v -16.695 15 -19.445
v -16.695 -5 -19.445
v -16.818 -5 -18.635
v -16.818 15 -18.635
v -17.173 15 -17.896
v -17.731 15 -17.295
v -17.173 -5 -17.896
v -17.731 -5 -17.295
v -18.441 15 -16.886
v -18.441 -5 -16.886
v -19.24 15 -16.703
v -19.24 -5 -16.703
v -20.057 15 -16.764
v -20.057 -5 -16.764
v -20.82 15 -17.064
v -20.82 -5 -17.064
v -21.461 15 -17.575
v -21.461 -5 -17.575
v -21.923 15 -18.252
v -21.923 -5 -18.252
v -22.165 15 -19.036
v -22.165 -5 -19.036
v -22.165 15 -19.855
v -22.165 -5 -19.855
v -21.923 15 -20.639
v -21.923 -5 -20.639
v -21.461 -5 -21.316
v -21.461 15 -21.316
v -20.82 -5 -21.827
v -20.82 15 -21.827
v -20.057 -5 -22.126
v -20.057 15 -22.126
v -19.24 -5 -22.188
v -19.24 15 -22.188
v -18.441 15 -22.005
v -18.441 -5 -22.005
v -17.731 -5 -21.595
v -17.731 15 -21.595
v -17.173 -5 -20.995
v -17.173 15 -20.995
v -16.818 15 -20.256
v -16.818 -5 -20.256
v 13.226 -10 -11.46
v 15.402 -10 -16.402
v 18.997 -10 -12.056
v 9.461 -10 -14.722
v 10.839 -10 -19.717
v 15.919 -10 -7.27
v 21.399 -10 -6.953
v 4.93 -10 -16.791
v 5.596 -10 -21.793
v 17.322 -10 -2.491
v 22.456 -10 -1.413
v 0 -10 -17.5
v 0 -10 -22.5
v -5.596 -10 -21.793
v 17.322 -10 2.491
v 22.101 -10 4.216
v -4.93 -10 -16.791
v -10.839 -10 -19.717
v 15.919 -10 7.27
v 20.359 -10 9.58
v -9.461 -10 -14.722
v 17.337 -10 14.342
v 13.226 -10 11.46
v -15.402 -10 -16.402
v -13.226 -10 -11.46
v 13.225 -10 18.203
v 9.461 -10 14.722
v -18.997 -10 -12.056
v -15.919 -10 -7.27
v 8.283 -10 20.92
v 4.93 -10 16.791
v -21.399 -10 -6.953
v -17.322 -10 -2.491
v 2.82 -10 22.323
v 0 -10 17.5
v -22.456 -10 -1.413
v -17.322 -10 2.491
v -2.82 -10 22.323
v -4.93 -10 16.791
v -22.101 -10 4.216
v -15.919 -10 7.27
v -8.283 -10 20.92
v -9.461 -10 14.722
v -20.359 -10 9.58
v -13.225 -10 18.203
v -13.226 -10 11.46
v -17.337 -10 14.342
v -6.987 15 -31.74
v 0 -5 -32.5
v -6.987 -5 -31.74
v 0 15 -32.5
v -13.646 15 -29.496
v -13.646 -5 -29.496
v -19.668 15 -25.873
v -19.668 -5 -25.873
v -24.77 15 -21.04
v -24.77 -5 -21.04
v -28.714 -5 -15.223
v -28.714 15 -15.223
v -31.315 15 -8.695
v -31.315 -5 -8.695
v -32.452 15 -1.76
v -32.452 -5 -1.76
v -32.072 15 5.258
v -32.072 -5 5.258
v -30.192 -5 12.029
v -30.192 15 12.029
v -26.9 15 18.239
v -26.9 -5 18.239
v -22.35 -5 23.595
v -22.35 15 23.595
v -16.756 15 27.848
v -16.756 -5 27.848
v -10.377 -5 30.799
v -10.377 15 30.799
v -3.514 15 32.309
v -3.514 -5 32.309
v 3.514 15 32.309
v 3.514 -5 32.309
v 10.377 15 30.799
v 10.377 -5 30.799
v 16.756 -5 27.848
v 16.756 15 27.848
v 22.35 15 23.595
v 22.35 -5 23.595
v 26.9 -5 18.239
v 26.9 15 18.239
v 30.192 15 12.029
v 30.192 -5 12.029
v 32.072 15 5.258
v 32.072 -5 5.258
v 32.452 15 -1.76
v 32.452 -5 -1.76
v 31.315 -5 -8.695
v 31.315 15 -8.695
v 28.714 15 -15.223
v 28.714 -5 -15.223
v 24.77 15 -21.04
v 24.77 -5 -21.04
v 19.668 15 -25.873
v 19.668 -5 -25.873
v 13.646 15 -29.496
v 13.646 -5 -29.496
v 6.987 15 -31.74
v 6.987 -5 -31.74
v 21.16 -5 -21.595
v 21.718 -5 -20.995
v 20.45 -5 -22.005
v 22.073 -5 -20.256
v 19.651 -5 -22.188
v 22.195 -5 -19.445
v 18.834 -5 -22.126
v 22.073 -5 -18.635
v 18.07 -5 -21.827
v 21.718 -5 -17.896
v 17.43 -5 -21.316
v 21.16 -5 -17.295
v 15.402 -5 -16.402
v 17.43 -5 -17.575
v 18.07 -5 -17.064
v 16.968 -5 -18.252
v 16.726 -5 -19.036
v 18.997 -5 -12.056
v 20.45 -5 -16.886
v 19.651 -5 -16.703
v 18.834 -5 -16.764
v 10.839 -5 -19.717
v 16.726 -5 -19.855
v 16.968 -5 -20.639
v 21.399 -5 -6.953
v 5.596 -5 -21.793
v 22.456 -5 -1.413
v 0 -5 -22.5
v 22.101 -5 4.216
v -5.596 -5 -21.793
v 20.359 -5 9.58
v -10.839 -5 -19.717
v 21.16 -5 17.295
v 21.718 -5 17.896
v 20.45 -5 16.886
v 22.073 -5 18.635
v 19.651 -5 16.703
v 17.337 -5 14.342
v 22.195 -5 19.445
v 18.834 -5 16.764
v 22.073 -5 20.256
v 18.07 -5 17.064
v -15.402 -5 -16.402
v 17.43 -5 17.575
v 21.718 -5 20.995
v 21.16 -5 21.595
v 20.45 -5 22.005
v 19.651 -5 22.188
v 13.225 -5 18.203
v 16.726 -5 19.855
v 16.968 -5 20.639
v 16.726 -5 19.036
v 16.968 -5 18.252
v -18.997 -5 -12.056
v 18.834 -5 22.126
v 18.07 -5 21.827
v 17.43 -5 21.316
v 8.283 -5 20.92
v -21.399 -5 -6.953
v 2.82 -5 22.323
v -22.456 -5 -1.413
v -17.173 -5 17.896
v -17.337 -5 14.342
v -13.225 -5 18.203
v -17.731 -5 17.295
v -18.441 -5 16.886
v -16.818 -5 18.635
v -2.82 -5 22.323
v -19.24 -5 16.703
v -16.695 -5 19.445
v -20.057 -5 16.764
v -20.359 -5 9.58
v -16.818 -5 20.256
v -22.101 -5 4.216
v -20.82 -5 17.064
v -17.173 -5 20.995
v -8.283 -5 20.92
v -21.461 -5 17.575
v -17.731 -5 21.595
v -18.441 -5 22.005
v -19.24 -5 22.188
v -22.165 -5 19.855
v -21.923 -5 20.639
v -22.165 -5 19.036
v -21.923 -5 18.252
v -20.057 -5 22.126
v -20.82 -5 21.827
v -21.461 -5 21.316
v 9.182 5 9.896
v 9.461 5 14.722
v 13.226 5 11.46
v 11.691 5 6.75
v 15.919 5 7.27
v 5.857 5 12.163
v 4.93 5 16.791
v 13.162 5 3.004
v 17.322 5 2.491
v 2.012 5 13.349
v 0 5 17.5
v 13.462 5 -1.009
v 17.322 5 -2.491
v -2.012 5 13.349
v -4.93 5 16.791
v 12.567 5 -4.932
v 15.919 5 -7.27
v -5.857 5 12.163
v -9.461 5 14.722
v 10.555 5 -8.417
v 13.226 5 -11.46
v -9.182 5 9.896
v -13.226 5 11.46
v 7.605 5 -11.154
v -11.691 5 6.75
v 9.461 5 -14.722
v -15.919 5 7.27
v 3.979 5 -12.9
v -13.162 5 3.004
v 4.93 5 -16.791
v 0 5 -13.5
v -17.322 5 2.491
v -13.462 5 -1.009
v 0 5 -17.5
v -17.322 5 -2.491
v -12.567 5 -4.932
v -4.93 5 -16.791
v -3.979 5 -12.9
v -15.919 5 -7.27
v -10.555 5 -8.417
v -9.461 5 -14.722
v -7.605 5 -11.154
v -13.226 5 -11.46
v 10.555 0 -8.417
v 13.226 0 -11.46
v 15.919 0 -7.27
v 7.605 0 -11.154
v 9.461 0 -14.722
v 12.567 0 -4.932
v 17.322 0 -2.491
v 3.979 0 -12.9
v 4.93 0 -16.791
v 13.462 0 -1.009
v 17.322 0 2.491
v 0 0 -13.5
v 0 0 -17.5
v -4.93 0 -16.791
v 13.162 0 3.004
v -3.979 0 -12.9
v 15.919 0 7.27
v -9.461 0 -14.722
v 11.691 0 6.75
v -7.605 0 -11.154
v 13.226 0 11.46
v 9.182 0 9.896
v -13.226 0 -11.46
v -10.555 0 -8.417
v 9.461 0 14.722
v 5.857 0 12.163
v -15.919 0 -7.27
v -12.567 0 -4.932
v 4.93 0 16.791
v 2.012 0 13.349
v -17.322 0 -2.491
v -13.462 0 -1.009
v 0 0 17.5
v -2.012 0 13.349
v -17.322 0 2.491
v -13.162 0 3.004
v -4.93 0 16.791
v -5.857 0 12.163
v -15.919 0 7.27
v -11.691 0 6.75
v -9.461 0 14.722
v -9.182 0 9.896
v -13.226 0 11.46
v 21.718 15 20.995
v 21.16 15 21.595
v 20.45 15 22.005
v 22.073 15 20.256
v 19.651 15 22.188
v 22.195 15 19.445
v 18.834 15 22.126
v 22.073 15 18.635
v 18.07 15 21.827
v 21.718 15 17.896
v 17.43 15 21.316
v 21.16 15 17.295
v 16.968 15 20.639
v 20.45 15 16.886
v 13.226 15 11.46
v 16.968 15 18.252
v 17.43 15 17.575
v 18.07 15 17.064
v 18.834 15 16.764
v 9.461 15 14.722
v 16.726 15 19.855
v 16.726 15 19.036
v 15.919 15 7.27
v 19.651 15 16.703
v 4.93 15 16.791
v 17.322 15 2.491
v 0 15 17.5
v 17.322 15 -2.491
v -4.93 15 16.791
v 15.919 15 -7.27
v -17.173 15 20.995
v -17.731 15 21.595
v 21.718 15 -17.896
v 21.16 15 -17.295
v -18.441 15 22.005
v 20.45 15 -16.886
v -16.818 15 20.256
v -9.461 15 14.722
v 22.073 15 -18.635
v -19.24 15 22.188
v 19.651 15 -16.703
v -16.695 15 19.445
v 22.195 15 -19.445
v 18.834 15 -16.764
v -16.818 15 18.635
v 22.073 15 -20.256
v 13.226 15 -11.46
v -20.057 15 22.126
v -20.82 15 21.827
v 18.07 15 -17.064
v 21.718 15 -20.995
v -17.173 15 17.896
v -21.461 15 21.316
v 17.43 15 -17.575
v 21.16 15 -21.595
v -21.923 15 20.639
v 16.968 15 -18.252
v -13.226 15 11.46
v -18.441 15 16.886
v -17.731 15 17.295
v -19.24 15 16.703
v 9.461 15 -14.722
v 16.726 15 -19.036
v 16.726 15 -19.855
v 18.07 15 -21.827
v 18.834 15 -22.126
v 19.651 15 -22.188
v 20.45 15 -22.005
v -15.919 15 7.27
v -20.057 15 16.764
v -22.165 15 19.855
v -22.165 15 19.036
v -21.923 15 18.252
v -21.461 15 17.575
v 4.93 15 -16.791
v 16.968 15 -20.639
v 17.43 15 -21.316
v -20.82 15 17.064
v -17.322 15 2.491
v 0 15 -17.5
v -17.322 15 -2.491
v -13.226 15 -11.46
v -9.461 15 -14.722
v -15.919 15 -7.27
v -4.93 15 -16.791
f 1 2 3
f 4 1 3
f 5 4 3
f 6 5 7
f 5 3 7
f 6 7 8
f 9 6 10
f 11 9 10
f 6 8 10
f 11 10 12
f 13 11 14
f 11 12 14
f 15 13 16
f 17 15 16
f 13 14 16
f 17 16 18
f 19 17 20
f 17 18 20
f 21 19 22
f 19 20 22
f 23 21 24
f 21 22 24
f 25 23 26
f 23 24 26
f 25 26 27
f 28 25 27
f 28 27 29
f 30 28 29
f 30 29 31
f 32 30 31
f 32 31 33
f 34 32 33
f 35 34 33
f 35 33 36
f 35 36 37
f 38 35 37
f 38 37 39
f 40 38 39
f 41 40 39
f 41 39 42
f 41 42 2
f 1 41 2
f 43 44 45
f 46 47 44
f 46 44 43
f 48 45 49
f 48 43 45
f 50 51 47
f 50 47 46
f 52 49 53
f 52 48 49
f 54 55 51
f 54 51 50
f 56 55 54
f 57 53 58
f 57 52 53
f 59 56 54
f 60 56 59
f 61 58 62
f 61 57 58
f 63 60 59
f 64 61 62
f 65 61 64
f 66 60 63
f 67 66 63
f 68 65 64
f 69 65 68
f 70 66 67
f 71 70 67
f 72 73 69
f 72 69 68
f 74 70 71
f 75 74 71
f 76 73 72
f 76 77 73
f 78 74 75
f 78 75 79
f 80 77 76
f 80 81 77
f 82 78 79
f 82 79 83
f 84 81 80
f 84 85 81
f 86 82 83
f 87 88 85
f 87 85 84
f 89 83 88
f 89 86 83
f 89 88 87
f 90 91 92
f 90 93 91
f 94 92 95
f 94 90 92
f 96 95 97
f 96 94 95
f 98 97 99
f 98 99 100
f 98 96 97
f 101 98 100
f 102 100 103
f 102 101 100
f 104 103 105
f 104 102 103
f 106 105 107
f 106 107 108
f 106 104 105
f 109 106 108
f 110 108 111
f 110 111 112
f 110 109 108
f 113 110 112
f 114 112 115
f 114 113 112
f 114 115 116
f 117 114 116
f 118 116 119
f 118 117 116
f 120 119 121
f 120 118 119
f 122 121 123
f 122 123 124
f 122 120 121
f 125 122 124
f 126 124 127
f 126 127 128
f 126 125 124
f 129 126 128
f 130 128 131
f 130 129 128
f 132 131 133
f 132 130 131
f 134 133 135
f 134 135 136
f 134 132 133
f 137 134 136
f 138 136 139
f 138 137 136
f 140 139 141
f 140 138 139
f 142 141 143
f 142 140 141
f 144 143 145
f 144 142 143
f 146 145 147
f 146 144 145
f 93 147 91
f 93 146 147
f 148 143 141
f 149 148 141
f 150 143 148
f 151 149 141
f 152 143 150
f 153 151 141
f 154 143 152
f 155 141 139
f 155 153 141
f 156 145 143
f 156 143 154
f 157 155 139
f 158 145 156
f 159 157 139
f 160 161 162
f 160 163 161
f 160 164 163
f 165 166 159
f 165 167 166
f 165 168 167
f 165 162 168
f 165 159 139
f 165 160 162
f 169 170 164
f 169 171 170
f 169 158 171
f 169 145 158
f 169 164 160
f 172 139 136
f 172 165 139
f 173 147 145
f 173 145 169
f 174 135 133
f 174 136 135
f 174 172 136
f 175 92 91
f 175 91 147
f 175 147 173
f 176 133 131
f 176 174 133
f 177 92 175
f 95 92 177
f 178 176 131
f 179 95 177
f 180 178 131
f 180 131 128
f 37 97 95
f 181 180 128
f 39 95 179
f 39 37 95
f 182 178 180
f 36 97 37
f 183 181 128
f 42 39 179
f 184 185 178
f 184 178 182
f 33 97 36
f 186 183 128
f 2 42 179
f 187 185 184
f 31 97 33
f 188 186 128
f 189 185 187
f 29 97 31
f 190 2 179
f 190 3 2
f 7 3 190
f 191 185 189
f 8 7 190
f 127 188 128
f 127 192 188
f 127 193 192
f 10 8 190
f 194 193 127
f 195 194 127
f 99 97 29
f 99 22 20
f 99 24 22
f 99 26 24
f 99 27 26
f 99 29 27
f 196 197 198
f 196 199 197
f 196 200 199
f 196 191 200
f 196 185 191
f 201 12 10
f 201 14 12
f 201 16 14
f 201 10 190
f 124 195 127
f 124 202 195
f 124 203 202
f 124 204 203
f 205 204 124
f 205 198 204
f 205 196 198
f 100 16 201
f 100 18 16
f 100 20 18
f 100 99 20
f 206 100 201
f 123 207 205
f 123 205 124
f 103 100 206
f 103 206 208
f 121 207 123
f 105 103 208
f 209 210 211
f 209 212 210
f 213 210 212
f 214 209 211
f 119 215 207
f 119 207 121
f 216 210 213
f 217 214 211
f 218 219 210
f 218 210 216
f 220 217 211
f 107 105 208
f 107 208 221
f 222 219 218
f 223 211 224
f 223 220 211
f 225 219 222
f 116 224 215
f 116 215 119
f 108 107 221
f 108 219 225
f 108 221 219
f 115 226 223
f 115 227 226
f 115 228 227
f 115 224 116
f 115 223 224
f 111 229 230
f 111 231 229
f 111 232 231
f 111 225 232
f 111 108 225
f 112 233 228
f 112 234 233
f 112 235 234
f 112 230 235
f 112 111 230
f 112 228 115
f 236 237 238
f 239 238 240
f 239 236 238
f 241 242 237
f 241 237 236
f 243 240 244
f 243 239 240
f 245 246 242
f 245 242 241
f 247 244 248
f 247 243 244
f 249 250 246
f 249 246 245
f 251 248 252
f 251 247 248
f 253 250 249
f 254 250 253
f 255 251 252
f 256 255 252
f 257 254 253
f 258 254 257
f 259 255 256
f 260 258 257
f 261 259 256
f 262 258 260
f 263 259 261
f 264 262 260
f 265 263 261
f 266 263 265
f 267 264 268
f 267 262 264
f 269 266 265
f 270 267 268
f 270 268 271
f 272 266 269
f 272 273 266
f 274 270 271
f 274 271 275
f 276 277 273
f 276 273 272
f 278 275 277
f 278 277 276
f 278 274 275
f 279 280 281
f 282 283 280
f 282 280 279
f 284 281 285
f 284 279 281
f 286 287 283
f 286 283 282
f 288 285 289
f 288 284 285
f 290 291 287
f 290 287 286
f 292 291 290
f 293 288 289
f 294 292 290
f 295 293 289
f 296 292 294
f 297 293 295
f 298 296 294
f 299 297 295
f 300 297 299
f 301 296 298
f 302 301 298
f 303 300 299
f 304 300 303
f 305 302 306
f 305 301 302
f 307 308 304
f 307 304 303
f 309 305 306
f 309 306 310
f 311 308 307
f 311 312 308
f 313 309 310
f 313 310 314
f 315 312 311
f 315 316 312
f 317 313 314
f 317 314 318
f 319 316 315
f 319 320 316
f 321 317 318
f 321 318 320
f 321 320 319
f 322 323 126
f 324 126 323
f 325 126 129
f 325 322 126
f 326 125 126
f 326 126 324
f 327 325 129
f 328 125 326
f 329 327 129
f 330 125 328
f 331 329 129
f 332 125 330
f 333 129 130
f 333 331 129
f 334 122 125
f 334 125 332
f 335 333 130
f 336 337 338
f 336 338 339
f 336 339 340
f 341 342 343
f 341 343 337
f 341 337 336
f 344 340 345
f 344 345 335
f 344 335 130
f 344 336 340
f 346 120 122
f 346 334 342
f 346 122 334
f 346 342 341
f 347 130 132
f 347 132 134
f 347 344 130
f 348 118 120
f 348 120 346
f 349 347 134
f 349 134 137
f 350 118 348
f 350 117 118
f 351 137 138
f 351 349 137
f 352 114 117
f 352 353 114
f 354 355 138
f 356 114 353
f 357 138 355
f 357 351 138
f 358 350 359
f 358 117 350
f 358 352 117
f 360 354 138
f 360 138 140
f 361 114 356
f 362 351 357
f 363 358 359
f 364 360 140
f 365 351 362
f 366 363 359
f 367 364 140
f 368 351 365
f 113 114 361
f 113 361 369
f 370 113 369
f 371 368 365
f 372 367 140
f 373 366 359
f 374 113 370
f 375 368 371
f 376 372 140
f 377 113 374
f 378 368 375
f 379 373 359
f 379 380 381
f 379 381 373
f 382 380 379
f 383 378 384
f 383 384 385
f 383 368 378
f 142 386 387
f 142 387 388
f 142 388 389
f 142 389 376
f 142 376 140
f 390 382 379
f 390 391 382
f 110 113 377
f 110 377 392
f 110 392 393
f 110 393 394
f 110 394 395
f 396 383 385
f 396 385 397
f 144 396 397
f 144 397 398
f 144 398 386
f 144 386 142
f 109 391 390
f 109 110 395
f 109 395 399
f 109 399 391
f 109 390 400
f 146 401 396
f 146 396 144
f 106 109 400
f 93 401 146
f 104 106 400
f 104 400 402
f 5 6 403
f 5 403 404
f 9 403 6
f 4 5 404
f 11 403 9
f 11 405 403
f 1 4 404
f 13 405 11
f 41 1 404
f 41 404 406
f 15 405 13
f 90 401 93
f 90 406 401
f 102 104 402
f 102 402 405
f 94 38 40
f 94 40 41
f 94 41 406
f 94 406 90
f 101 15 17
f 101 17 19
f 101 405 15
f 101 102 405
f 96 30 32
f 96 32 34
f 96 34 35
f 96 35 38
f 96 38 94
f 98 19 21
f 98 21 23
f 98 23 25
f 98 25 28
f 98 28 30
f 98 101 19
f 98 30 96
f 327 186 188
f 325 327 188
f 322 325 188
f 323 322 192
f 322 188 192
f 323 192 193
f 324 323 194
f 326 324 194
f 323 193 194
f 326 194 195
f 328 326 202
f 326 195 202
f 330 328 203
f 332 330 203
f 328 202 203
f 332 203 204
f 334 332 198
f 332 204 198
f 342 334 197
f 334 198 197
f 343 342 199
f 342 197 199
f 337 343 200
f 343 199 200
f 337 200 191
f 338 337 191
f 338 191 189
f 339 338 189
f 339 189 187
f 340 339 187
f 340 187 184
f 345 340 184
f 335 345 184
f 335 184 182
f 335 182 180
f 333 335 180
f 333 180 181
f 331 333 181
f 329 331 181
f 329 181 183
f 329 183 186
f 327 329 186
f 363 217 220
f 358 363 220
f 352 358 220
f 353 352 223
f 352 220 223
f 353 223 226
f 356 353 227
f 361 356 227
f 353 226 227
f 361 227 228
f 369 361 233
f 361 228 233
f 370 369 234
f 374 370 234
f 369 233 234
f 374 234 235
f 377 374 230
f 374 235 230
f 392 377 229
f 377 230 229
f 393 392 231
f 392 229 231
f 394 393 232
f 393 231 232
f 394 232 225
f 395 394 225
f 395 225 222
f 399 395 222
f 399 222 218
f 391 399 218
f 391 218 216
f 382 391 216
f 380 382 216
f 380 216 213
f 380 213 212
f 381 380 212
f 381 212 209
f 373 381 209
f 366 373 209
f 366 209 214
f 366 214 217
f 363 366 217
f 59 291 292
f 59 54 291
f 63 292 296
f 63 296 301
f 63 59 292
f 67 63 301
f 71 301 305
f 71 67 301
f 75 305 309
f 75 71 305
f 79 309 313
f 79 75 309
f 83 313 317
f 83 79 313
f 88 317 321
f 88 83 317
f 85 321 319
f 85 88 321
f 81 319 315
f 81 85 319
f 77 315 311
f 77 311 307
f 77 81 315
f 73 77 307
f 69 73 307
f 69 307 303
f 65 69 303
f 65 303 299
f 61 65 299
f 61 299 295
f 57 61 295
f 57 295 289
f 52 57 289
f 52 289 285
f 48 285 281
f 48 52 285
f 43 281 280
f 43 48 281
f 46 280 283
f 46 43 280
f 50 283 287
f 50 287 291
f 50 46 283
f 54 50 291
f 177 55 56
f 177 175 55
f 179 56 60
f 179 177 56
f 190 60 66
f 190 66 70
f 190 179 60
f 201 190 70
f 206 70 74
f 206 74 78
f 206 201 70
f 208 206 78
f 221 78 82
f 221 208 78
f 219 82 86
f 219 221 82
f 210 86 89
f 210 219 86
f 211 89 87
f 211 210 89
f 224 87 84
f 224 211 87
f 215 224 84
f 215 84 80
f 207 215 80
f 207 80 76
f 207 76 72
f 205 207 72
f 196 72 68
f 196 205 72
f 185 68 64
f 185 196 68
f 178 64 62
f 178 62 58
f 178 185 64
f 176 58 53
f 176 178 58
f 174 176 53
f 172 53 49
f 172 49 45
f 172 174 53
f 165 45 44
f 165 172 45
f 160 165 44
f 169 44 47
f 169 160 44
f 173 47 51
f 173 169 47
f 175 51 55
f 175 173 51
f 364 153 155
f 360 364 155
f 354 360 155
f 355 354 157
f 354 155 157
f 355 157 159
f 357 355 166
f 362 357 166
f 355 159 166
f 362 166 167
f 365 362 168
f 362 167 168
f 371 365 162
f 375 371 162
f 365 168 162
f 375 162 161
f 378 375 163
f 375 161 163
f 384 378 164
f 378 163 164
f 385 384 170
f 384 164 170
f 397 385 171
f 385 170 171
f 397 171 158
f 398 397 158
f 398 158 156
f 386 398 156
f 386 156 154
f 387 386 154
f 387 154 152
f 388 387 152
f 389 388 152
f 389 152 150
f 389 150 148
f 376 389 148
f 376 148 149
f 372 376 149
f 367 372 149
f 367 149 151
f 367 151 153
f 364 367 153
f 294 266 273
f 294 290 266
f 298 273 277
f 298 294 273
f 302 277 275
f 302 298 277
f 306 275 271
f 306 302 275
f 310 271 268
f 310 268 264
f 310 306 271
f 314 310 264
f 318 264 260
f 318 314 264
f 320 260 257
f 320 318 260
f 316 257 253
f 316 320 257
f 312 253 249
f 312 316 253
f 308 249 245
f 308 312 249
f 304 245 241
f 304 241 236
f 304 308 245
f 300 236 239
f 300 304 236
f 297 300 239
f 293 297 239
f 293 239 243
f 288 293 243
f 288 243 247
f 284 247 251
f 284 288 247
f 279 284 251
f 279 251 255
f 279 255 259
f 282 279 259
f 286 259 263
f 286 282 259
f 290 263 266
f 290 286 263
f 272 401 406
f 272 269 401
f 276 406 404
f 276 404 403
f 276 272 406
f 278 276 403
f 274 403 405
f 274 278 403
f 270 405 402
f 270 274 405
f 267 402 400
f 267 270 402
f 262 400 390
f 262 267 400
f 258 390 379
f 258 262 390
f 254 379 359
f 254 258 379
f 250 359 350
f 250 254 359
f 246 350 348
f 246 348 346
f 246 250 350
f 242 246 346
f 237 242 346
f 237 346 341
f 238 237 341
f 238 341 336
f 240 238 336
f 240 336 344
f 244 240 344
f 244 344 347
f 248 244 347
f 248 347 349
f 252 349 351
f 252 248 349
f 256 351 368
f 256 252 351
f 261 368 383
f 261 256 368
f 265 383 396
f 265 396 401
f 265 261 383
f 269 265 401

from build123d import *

# Parameters (mm, degrees)
HOLE_WIZARD_M51_D = 5.5


with BuildPart() as part:
    # Эскиз1 → Повернуть1 (revolve)
    with BuildSketch(Plane.XY, mode=Mode.PRIVATE) as revolve_1_sk:
        Polygon((13.5, 5), (13.5, 0), (17.5, 0), (17.5, -10), (22.5, -10), (22.5, -5), (32.5, -5), (32.5, 15), (17.5, 15), (17.5, 5), align=None)
    revolve(revolve_1_sk.sketch.rotate(Axis((0, 0, 0), (0, 1, 0)), 90), axis=Axis((0, 0, 0), (0, 1, 0)))

    # Отверстие с зазором M51 (through all)
    with Locations(Plane(origin=(0, 15, 0), x_dir=(-1, 0, 0), z_dir=(0, 1, 0))):
        with Locations((19.445436483, 19.445436483), (19.445436483, -19.445436483), (-19.445436483, -19.445436483), (-19.445436483, 19.445436483)):
            Hole(HOLE_WIZARD_M51_D / 2)


solid = part.part
